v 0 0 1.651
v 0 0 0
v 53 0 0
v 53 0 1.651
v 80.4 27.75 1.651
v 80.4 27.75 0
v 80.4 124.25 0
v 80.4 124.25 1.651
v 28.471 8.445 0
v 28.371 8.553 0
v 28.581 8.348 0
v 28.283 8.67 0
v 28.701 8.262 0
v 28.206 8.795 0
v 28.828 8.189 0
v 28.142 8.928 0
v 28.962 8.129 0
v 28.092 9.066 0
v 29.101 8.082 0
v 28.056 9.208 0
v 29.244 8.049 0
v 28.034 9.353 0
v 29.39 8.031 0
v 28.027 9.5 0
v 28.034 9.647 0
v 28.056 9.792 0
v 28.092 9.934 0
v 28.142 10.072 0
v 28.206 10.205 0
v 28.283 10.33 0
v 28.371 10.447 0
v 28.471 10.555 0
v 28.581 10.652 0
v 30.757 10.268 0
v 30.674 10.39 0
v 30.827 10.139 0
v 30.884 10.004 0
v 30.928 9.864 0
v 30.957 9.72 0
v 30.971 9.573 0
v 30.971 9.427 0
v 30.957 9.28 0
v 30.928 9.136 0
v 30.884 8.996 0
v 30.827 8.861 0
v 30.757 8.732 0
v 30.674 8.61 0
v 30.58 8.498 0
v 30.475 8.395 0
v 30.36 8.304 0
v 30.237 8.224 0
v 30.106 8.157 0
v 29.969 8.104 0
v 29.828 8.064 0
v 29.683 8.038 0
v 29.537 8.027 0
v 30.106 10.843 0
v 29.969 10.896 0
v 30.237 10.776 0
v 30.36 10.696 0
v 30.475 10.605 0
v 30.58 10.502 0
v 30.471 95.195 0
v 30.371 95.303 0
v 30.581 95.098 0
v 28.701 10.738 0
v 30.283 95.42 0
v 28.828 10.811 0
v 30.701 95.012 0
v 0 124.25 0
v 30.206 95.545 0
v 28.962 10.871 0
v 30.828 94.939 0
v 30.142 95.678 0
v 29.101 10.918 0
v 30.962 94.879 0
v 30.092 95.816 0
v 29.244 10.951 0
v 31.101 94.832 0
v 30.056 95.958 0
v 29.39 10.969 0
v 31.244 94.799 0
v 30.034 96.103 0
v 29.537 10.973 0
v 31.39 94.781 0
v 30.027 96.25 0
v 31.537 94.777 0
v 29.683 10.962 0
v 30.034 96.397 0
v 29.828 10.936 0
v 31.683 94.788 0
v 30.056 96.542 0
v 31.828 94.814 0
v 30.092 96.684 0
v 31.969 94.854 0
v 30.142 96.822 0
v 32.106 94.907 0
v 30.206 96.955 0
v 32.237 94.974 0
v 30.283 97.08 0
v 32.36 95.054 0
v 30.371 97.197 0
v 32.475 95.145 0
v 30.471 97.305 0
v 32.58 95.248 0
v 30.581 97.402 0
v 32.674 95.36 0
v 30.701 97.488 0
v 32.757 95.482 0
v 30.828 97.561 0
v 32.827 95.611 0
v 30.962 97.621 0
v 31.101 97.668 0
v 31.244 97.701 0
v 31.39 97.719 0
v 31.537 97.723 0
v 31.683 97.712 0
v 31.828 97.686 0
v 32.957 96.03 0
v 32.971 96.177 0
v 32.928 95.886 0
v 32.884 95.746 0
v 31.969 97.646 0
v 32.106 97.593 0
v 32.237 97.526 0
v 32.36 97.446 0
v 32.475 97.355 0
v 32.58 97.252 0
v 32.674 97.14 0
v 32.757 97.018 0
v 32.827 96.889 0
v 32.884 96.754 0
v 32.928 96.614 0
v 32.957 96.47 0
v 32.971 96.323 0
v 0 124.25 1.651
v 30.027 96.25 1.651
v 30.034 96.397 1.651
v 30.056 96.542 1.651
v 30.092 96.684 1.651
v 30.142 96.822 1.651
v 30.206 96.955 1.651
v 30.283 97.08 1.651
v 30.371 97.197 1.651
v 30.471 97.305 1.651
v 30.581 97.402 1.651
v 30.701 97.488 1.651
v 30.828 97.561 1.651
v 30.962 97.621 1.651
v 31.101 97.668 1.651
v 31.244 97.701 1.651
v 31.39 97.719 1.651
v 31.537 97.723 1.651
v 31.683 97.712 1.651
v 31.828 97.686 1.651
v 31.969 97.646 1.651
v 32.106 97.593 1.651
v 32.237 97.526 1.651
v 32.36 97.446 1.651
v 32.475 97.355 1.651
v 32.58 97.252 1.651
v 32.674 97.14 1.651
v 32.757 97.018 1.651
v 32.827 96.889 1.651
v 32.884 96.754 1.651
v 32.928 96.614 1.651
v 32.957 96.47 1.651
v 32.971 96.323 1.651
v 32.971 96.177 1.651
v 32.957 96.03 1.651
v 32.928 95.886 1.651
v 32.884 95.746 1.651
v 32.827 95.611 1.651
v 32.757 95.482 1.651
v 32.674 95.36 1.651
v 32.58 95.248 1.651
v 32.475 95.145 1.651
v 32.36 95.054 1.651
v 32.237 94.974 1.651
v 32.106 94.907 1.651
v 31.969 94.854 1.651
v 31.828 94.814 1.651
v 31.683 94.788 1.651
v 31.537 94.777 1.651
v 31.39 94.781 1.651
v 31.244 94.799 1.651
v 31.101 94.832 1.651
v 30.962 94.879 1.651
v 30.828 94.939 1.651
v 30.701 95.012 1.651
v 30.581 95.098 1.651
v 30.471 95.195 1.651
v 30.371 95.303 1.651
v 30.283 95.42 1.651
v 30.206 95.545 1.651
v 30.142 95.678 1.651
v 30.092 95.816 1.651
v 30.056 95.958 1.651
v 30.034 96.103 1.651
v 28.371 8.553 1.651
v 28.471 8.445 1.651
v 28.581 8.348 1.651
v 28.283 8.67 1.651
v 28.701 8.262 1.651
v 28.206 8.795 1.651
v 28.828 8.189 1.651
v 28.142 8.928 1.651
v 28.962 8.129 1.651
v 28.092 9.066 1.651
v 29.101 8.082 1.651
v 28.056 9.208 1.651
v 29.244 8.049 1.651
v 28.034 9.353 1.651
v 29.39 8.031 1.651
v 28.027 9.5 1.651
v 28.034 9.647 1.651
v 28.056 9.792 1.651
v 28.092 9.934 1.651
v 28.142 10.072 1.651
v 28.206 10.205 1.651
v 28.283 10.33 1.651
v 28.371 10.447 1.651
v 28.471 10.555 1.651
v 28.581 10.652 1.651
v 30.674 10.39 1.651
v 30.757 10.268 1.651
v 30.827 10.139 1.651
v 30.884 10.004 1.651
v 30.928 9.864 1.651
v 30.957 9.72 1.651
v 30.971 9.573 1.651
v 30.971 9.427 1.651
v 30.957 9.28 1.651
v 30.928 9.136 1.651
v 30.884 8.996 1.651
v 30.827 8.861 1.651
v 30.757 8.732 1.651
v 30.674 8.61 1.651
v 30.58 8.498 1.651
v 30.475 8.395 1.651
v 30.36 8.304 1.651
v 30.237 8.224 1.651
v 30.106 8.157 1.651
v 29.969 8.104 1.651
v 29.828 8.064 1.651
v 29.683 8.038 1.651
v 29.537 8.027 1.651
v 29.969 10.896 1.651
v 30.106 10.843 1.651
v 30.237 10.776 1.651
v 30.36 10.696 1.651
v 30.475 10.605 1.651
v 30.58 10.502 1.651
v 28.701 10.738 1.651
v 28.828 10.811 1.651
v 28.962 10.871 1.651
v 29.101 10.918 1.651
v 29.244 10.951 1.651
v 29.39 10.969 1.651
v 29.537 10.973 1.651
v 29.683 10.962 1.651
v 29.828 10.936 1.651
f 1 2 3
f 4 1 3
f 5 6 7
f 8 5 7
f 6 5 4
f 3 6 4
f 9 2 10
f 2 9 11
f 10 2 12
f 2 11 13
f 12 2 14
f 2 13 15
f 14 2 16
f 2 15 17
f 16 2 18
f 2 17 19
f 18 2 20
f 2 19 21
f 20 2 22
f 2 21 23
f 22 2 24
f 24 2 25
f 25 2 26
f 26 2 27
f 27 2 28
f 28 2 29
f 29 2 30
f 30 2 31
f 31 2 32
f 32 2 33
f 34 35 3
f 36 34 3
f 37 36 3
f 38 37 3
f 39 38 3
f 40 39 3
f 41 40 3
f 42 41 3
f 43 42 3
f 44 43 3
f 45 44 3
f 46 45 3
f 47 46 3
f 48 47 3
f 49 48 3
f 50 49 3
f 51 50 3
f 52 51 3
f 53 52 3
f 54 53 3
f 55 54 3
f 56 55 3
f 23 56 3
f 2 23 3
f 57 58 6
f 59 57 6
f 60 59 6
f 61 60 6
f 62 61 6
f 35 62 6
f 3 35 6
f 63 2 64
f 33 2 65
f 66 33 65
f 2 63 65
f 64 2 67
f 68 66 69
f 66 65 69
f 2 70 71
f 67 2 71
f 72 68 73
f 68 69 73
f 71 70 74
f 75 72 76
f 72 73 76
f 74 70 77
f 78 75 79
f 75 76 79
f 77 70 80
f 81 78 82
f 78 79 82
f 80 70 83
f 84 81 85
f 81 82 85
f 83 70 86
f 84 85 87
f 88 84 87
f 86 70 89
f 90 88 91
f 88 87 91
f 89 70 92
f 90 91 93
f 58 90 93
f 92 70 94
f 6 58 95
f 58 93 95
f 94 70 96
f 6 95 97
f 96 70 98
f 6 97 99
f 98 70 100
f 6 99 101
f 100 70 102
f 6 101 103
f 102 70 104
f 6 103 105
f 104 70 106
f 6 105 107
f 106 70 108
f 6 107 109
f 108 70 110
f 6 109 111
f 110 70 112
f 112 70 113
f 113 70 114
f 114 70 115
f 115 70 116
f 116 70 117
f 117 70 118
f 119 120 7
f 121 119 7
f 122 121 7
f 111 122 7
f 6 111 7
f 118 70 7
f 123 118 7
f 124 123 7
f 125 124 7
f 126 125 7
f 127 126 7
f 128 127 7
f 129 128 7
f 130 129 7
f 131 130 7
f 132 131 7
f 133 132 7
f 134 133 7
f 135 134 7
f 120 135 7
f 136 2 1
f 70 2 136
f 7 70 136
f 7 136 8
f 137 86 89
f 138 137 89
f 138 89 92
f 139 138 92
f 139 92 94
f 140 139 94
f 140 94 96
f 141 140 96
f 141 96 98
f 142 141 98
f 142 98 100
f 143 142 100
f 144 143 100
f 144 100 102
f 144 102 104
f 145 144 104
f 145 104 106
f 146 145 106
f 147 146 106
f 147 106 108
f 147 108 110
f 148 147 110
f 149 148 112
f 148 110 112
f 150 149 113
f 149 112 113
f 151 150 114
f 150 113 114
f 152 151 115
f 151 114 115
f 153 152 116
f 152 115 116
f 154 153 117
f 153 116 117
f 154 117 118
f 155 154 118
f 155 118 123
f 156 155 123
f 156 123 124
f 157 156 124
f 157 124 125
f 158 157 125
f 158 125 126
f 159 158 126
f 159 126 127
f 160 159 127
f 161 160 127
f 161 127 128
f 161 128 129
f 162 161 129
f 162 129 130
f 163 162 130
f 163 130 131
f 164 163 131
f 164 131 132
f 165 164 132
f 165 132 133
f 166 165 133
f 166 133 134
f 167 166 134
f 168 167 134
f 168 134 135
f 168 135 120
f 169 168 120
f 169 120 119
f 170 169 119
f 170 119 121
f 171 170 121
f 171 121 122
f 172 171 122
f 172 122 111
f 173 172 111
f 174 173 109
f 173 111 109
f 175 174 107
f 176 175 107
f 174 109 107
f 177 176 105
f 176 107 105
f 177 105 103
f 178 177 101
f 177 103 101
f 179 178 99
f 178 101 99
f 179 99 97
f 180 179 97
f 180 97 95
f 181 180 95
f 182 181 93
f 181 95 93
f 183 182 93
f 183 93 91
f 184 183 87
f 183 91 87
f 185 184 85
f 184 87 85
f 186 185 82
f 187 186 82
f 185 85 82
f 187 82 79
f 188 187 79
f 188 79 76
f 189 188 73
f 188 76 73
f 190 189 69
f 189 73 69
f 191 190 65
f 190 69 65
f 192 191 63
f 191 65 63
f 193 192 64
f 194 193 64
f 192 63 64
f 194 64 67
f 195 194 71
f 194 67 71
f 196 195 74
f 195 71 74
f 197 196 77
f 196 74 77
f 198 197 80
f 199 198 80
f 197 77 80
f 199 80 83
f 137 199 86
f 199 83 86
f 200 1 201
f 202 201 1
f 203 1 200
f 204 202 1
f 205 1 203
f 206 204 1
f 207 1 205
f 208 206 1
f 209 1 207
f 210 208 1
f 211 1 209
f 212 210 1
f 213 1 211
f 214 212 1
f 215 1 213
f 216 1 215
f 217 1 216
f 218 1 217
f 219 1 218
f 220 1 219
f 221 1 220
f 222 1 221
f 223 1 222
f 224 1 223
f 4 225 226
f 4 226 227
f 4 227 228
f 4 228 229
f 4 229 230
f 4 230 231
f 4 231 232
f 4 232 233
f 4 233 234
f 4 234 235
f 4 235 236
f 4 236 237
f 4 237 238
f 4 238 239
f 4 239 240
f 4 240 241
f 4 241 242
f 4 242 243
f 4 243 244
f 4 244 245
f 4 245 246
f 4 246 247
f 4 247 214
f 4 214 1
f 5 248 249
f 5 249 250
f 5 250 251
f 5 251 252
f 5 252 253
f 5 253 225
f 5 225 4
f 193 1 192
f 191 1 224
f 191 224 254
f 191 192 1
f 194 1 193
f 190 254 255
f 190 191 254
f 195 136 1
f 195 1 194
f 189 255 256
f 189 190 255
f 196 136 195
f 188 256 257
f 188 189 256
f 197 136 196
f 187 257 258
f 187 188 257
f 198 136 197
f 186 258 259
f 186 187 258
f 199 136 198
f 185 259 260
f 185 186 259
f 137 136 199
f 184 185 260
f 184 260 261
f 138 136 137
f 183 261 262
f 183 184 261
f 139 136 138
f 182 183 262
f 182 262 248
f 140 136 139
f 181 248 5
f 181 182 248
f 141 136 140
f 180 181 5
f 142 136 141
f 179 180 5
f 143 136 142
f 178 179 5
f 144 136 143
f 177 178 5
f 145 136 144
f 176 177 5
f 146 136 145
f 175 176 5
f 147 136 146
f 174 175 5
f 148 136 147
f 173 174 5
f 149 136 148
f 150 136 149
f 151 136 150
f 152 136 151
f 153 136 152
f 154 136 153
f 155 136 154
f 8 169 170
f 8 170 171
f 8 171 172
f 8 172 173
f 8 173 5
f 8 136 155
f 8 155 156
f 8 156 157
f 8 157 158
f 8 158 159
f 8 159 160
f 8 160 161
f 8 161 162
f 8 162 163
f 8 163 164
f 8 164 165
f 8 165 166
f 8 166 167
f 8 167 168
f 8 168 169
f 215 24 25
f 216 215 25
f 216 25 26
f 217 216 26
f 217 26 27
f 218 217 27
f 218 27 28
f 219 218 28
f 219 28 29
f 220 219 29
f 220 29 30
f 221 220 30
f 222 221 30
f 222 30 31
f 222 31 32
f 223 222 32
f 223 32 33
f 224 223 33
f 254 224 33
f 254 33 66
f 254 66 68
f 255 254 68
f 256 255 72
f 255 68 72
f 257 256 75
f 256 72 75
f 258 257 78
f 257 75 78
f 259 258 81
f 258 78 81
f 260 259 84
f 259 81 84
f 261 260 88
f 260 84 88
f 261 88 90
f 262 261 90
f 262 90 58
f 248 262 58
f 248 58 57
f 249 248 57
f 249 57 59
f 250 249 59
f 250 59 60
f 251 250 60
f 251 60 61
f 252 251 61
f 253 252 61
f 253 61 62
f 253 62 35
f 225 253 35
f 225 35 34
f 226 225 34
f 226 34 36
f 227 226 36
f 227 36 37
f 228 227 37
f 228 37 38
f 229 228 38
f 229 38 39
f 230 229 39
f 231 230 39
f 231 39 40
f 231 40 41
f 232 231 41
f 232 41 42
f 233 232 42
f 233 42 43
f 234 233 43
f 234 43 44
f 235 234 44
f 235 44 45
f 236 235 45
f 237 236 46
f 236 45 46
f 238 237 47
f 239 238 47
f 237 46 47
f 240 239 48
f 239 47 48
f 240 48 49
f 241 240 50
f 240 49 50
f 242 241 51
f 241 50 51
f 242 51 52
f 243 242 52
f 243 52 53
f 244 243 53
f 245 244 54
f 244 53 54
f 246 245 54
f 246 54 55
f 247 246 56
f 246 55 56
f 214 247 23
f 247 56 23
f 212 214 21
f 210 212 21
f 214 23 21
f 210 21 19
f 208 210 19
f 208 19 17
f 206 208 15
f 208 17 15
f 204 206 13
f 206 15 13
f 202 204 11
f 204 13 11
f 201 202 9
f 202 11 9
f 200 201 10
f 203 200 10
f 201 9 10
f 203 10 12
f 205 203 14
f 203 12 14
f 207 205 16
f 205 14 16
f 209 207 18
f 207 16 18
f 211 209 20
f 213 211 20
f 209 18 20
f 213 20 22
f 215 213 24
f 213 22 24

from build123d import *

# Parameters (mm, degrees)
F0_W     = 80.4
F0_H     = 124.25
F1_DEPTH = 1.651
F3_DEPTH = 1.652
F5_D     = 2.9464


with BuildPart() as f1:
    # F0 (on Top) → F1 (new body)
    with BuildSketch(Plane.XY):
        with Locations((40.2, 62.125)):
            Rectangle(F0_W, F0_H)
    extrude(amount=F1_DEPTH)

    # F2 (on face) → F3 (cut, through all)
    with BuildSketch(Plane.XY.offset(1.651)):
        Polygon((80.4, 0), (80.4, 27.75), (53, 0), align=None)
    extrude(amount=-F3_DEPTH, mode=Mode.SUBTRACT)

    # F5 (through all)
    with Locations(Plane.XY.offset(1.651)):
        with Locations((31.5, 96.25), (29.5, 9.5)):
            Hole(F5_D / 2)


solid = f1.part
